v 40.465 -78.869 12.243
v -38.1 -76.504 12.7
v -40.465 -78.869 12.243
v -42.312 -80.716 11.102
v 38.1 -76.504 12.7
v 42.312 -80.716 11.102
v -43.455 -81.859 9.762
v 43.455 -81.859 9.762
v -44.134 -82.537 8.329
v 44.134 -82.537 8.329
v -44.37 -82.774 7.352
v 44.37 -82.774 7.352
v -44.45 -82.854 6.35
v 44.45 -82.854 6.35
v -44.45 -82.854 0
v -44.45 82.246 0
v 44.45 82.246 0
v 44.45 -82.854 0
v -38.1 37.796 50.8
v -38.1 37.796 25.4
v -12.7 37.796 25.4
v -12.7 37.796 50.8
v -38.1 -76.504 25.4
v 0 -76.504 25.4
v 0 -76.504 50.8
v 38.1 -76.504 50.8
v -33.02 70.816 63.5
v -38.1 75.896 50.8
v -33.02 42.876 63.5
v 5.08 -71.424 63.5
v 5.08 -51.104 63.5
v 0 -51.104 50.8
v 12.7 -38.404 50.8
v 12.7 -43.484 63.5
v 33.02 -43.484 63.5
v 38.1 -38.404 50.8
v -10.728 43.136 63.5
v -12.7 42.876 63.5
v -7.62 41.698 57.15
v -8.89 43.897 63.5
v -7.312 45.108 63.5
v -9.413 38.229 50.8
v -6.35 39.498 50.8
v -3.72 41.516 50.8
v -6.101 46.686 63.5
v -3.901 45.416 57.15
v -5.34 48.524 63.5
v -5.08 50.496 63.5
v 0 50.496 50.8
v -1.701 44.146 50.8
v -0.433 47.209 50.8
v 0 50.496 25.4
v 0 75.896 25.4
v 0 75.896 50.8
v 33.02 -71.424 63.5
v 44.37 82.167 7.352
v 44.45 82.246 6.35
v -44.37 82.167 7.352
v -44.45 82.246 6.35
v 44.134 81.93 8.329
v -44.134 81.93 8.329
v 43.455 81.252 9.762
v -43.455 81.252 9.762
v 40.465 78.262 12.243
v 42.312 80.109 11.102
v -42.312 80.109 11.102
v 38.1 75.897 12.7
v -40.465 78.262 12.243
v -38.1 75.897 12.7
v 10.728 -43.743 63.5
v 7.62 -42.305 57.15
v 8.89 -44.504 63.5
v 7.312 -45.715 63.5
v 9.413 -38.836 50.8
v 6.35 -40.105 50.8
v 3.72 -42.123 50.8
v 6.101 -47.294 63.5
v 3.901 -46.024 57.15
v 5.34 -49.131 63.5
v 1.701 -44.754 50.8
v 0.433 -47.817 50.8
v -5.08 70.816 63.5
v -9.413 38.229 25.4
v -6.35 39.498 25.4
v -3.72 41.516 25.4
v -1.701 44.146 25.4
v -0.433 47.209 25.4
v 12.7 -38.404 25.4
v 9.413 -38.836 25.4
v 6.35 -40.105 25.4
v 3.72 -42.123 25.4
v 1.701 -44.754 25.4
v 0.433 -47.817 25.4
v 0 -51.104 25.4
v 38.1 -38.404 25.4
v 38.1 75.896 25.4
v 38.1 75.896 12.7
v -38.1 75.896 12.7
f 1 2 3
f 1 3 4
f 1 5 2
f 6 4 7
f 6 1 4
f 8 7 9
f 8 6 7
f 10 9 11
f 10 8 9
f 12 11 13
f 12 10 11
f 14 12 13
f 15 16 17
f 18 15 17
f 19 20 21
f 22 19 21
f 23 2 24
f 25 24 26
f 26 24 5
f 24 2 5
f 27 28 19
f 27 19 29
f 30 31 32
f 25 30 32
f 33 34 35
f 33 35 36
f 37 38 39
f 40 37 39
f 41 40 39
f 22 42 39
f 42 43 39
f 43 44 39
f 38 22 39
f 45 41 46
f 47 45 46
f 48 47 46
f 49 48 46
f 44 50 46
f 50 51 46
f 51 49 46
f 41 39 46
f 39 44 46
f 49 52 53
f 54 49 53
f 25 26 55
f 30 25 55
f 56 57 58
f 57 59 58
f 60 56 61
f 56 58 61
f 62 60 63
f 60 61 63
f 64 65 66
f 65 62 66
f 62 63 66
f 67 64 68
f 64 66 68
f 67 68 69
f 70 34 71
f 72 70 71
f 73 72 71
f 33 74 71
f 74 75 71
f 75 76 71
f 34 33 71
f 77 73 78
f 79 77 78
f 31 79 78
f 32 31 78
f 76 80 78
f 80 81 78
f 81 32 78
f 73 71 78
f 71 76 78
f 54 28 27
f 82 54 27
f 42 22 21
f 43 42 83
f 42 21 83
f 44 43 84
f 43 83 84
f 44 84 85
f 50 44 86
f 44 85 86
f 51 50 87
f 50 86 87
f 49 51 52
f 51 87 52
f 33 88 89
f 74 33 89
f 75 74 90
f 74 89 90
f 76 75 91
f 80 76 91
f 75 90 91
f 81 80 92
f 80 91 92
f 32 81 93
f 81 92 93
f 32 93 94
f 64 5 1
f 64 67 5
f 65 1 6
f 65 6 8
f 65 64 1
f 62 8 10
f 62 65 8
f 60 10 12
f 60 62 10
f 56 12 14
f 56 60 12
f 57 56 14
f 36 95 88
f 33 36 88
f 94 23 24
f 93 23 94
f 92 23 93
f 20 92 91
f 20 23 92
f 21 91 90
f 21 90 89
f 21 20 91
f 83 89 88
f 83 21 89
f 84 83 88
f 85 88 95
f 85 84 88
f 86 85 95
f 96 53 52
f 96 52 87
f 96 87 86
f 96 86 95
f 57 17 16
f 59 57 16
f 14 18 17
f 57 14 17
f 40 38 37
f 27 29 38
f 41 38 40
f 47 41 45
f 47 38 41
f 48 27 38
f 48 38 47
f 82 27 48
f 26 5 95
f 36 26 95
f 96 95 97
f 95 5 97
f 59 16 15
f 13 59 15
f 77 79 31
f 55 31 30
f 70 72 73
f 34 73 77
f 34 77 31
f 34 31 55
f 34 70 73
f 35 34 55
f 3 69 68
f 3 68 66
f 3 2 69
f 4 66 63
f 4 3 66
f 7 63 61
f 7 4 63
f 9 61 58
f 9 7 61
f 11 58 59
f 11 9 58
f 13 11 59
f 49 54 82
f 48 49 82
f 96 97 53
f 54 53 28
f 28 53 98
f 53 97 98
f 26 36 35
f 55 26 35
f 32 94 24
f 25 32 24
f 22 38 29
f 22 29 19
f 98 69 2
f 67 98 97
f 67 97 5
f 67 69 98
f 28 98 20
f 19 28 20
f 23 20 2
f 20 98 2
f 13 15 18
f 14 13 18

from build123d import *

# Parameters (mm, degrees)
F1_DEPTH     = 12.7
F2_DEPTH     = 25.4
F3_DEPTH     = 63.5
F4_R         = 6.34999
F5_T1_DEPTH  = 103.9650864339
F5_T3_DEPTH  = 58.332543217
F5_T5_DEPTH  = 58.332543217
F5_T7_DEPTH  = 103.9650864339
F5_T9_DEPTH  = 103.9650864339
F5_T11_DEPTH = 103.9650864339
F5_T13_DEPTH = 58.332543217
F5_T15_DEPTH = 58.332543217
F5_T18_ANGLE = 90
F5_T20_ANGLE = 90


# Not quite as in the source:
# - a fillet or chamfer that OpenCascade refuses, or shapes differently, is made with other operations: its cross-section is extruded or revolved along the edge and cut away or added
# - a fillet or chamfer is up to 0.001 mm smaller than in the source, because OpenCascade refuses the exact size
# - a feature of the source that left no trace in its solid (it failed there, or was rolled back) is left out


with BuildPart() as f1:
    # F0 (on Top) → F1 (new body)
    with BuildSketch(Plane.XY):
        Polygon((38.0595053568, 82.2464972734), (-38.0927510742, 82.2464972734), (-44.45, 82.2464972734), (-44.45, 76.2), (-44.45, -82.8535027266), (-38.1, -82.8535027266), (44.45, -82.8535027266), (44.45, 82.2464972734), align=None)
        Polygon((-38.1, -76.5035027266), (-38.1, 0), (-38.1, 37.7964972734), (-38.1, 75.8964972734), (0, 75.8964972734), (38.1, 75.8964972734), (38.1, -38.4035027266), (38.1, -76.5035027266), (0, -76.5035027266), align=None, mode=Mode.SUBTRACT)
        with BuildLine():
            Line((-38.1, 75.8964972734), (-38.1, 37.7964972734))
            Line((-38.1, 37.7964972734), (-12.7, 37.7964972734))
            ThreePointArc((-12.7, 37.7964972734), (-3.7197438789, 41.5162411524), (0, 50.4964972734))
            Line((0, 50.4964972734), (0, 75.8964972734))
            Line((0, 75.8964972734), (-38.1, 75.8964972734))
        make_face()
        with BuildLine():
            Line((-38.1, 37.7964972734), (-38.1, 0))
            Line((-38.1, 0), (-38.1, -76.5035027266))
            Line((-38.1, -76.5035027266), (0, -76.5035027266))
            Line((0, -76.5035027266), (0, -51.1035027266))
            ThreePointArc((0, -51.1035027266), (3.7197438789, -42.1232466055), (12.7, -38.4035027266))
            Line((12.7, -38.4035027266), (38.1, -38.4035027266))
            Line((38.1, -38.4035027266), (38.1, 75.8964972734))
            Line((38.1, 75.8964972734), (0, 75.8964972734))
            Line((0, 75.8964972734), (0, 50.4964972734))
            ThreePointArc((0, 50.4964972734), (-3.7197438789, 41.5162411524), (-12.7, 37.7964972734))
            Line((-12.7, 37.7964972734), (-38.1, 37.7964972734))
        make_face()
        with BuildLine():
            Line((0, -51.1035027266), (0, -76.5035027266))
            Line((0, -76.5035027266), (38.1, -76.5035027266))
            Line((38.1, -76.5035027266), (38.1, -38.4035027266))
            Line((38.1, -38.4035027266), (12.7, -38.4035027266))
            ThreePointArc((12.7, -38.4035027266), (3.7197438789, -42.1232466055), (0, -51.1035027266))
        make_face()
    extrude(amount=F1_DEPTH)

    # F0 (on Top) → F2 (join)
    with BuildSketch(Plane.XY):
        with BuildLine():
            Line((0, -51.1035027266), (0, -76.5035027266))
            Line((0, -76.5035027266), (38.1, -76.5035027266))
            Line((38.1, -76.5035027266), (38.1, -38.4035027266))
            Line((38.1, -38.4035027266), (12.7, -38.4035027266))
            ThreePointArc((12.7, -38.4035027266), (3.7197438789, -42.1232466055), (0, -51.1035027266))
        make_face()
        with BuildLine():
            Line((-38.1, 37.7964972734), (-38.1, 0))
            Line((-38.1, 0), (-38.1, -76.5035027266))
            Line((-38.1, -76.5035027266), (0, -76.5035027266))
            Line((0, -76.5035027266), (0, -51.1035027266))
            ThreePointArc((0, -51.1035027266), (3.7197438789, -42.1232466055), (12.7, -38.4035027266))
            Line((12.7, -38.4035027266), (38.1, -38.4035027266))
            Line((38.1, -38.4035027266), (38.1, 75.8964972734))
            Line((38.1, 75.8964972734), (0, 75.8964972734))
            Line((0, 75.8964972734), (0, 50.4964972734))
            ThreePointArc((0, 50.4964972734), (-3.7197438789, 41.5162411524), (-12.7, 37.7964972734))
            Line((-12.7, 37.7964972734), (-38.1, 37.7964972734))
        make_face()
        with BuildLine():
            Line((-38.1, 75.8964972734), (-38.1, 37.7964972734))
            Line((-38.1, 37.7964972734), (-12.7, 37.7964972734))
            ThreePointArc((-12.7, 37.7964972734), (-3.7197438789, 41.5162411524), (0, 50.4964972734))
            Line((0, 50.4964972734), (0, 75.8964972734))
            Line((0, 75.8964972734), (-38.1, 75.8964972734))
        make_face()
    extrude(amount=F2_DEPTH)

    # F0 (on Top) → F3 (join)
    with BuildSketch(Plane.XY):
        with BuildLine():
            Line((0, -51.1035027266), (0, -76.5035027266))
            Line((0, -76.5035027266), (38.1, -76.5035027266))
            Line((38.1, -76.5035027266), (38.1, -38.4035027266))
            Line((38.1, -38.4035027266), (12.7, -38.4035027266))
            ThreePointArc((12.7, -38.4035027266), (3.7197438789, -42.1232466055), (0, -51.1035027266))
        make_face()
        with BuildLine():
            Line((-38.1, 75.8964972734), (-38.1, 37.7964972734))
            Line((-38.1, 37.7964972734), (-12.7, 37.7964972734))
            ThreePointArc((-12.7, 37.7964972734), (-3.7197438789, 41.5162411524), (0, 50.4964972734))
            Line((0, 50.4964972734), (0, 75.8964972734))
            Line((0, 75.8964972734), (-38.1, 75.8964972734))
        make_face()
    extrude(amount=F3_DEPTH)

    # F4 (radius 6.35 in the source; OpenCascade refuses exactly that, so slightly less here)
    f4_edges = [f1.edges().sort_by_distance(p)[0] for p in [
        (-44.45, -0.303503, 12.7),
        (0, -82.853503, 12.7),
        (44.45, -0.303503, 12.7),
        (0, 82.246497, 12.7),
    ]]
    fillet(f4_edges, radius=F4_R)

    # F5: chamfer of 5.08 x 12.7 on 10 edges, made by hand

    # F5_s2 → F5_t1 (cut)
    with BuildSketch(Plane.XZ.offset(5.4709595096)):
        Polygon((38.1, 50.8), (33.02, 63.5), (38.1, 63.5), align=None)
    extrude(amount=F5_T1_DEPTH, mode=Mode.SUBTRACT)

    # F5_s4 → F5_t3 (cut)
    with BuildSketch(Plane.YZ.offset(12.7)):
        Polygon((-43.4835027266, 63.5), (-38.4035027266, 50.8), (-38.4035027266, 63.5), align=None)
    extrude(amount=F5_T3_DEPTH, mode=Mode.SUBTRACT)

    # F5_s6 → F5_t5 (cut)
    with BuildSketch(Plane.XZ.offset(51.1035027266)):
        Polygon((5.08, 63.5), (0, 50.8), (0, 63.5), align=None)
    extrude(amount=F5_T5_DEPTH, mode=Mode.SUBTRACT)

    # F5_s8 → F5_t7 (cut)
    with BuildSketch(Plane.YZ.offset(-32.932543217)):
        Polygon((-76.5035027266, 50.8), (-71.4235027266, 63.5), (-76.5035027266, 63.5), align=None)
    extrude(amount=F5_T7_DEPTH, mode=Mode.SUBTRACT)

    # F5_s10 → F5_t9 (cut)
    with BuildSketch(Plane.YZ.offset(-71.032543217)):
        Polygon((75.8964972734, 50.8), (70.8164972734, 63.5), (75.8964972734, 63.5), align=None)
    extrude(amount=F5_T9_DEPTH, mode=Mode.SUBTRACT)

    # F5_s12 → F5_t11 (cut)
    with BuildSketch(Plane.XZ.offset(-108.8290404904)):
        Polygon((-38.1, 50.8), (-33.02, 63.5), (-38.1, 63.5), align=None)
    extrude(amount=F5_T11_DEPTH, mode=Mode.SUBTRACT)

    # F5_s14 → F5_t13 (cut)
    with BuildSketch(Plane.XZ.offset(-108.8290404904)):
        Polygon((0, 50.8), (-5.08, 63.5), (0, 63.5), align=None)
    extrude(amount=F5_T13_DEPTH, mode=Mode.SUBTRACT)

    # F5_s16 → F5_t15 (cut)
    with BuildSketch(Plane.YZ.offset(-71.032543217)):
        Polygon((42.8764972734, 63.5), (37.7964972734, 50.8), (37.7964972734, 63.5), align=None)
    extrude(amount=F5_T15_DEPTH, mode=Mode.SUBTRACT)

    # F5_s17 → F5_t18 (revolve, cut)
    with BuildSketch(Plane.YZ.offset(12.7)):
        Polygon((-43.4835027266, 63.5), (-38.4035027266, 50.8), (-38.4035027266, 63.5), align=None)
    revolve(axis=Axis((12.7, -51.1035027266, 63.5), (0, 0, 1)), revolution_arc=F5_T18_ANGLE, mode=Mode.SUBTRACT)

    # F5_s19 → F5_t20 (revolve, cut)
    with BuildSketch(Plane.YZ.offset(-12.7)):
        Polygon((42.8764972734, 63.5), (37.7964972734, 50.8), (37.7964972734, 63.5), align=None)
    revolve(axis=Axis((-12.7, 50.4964972734, 63.5), (0, 0, 1)), revolution_arc=F5_T20_ANGLE, mode=Mode.SUBTRACT)


solid = f1.part
